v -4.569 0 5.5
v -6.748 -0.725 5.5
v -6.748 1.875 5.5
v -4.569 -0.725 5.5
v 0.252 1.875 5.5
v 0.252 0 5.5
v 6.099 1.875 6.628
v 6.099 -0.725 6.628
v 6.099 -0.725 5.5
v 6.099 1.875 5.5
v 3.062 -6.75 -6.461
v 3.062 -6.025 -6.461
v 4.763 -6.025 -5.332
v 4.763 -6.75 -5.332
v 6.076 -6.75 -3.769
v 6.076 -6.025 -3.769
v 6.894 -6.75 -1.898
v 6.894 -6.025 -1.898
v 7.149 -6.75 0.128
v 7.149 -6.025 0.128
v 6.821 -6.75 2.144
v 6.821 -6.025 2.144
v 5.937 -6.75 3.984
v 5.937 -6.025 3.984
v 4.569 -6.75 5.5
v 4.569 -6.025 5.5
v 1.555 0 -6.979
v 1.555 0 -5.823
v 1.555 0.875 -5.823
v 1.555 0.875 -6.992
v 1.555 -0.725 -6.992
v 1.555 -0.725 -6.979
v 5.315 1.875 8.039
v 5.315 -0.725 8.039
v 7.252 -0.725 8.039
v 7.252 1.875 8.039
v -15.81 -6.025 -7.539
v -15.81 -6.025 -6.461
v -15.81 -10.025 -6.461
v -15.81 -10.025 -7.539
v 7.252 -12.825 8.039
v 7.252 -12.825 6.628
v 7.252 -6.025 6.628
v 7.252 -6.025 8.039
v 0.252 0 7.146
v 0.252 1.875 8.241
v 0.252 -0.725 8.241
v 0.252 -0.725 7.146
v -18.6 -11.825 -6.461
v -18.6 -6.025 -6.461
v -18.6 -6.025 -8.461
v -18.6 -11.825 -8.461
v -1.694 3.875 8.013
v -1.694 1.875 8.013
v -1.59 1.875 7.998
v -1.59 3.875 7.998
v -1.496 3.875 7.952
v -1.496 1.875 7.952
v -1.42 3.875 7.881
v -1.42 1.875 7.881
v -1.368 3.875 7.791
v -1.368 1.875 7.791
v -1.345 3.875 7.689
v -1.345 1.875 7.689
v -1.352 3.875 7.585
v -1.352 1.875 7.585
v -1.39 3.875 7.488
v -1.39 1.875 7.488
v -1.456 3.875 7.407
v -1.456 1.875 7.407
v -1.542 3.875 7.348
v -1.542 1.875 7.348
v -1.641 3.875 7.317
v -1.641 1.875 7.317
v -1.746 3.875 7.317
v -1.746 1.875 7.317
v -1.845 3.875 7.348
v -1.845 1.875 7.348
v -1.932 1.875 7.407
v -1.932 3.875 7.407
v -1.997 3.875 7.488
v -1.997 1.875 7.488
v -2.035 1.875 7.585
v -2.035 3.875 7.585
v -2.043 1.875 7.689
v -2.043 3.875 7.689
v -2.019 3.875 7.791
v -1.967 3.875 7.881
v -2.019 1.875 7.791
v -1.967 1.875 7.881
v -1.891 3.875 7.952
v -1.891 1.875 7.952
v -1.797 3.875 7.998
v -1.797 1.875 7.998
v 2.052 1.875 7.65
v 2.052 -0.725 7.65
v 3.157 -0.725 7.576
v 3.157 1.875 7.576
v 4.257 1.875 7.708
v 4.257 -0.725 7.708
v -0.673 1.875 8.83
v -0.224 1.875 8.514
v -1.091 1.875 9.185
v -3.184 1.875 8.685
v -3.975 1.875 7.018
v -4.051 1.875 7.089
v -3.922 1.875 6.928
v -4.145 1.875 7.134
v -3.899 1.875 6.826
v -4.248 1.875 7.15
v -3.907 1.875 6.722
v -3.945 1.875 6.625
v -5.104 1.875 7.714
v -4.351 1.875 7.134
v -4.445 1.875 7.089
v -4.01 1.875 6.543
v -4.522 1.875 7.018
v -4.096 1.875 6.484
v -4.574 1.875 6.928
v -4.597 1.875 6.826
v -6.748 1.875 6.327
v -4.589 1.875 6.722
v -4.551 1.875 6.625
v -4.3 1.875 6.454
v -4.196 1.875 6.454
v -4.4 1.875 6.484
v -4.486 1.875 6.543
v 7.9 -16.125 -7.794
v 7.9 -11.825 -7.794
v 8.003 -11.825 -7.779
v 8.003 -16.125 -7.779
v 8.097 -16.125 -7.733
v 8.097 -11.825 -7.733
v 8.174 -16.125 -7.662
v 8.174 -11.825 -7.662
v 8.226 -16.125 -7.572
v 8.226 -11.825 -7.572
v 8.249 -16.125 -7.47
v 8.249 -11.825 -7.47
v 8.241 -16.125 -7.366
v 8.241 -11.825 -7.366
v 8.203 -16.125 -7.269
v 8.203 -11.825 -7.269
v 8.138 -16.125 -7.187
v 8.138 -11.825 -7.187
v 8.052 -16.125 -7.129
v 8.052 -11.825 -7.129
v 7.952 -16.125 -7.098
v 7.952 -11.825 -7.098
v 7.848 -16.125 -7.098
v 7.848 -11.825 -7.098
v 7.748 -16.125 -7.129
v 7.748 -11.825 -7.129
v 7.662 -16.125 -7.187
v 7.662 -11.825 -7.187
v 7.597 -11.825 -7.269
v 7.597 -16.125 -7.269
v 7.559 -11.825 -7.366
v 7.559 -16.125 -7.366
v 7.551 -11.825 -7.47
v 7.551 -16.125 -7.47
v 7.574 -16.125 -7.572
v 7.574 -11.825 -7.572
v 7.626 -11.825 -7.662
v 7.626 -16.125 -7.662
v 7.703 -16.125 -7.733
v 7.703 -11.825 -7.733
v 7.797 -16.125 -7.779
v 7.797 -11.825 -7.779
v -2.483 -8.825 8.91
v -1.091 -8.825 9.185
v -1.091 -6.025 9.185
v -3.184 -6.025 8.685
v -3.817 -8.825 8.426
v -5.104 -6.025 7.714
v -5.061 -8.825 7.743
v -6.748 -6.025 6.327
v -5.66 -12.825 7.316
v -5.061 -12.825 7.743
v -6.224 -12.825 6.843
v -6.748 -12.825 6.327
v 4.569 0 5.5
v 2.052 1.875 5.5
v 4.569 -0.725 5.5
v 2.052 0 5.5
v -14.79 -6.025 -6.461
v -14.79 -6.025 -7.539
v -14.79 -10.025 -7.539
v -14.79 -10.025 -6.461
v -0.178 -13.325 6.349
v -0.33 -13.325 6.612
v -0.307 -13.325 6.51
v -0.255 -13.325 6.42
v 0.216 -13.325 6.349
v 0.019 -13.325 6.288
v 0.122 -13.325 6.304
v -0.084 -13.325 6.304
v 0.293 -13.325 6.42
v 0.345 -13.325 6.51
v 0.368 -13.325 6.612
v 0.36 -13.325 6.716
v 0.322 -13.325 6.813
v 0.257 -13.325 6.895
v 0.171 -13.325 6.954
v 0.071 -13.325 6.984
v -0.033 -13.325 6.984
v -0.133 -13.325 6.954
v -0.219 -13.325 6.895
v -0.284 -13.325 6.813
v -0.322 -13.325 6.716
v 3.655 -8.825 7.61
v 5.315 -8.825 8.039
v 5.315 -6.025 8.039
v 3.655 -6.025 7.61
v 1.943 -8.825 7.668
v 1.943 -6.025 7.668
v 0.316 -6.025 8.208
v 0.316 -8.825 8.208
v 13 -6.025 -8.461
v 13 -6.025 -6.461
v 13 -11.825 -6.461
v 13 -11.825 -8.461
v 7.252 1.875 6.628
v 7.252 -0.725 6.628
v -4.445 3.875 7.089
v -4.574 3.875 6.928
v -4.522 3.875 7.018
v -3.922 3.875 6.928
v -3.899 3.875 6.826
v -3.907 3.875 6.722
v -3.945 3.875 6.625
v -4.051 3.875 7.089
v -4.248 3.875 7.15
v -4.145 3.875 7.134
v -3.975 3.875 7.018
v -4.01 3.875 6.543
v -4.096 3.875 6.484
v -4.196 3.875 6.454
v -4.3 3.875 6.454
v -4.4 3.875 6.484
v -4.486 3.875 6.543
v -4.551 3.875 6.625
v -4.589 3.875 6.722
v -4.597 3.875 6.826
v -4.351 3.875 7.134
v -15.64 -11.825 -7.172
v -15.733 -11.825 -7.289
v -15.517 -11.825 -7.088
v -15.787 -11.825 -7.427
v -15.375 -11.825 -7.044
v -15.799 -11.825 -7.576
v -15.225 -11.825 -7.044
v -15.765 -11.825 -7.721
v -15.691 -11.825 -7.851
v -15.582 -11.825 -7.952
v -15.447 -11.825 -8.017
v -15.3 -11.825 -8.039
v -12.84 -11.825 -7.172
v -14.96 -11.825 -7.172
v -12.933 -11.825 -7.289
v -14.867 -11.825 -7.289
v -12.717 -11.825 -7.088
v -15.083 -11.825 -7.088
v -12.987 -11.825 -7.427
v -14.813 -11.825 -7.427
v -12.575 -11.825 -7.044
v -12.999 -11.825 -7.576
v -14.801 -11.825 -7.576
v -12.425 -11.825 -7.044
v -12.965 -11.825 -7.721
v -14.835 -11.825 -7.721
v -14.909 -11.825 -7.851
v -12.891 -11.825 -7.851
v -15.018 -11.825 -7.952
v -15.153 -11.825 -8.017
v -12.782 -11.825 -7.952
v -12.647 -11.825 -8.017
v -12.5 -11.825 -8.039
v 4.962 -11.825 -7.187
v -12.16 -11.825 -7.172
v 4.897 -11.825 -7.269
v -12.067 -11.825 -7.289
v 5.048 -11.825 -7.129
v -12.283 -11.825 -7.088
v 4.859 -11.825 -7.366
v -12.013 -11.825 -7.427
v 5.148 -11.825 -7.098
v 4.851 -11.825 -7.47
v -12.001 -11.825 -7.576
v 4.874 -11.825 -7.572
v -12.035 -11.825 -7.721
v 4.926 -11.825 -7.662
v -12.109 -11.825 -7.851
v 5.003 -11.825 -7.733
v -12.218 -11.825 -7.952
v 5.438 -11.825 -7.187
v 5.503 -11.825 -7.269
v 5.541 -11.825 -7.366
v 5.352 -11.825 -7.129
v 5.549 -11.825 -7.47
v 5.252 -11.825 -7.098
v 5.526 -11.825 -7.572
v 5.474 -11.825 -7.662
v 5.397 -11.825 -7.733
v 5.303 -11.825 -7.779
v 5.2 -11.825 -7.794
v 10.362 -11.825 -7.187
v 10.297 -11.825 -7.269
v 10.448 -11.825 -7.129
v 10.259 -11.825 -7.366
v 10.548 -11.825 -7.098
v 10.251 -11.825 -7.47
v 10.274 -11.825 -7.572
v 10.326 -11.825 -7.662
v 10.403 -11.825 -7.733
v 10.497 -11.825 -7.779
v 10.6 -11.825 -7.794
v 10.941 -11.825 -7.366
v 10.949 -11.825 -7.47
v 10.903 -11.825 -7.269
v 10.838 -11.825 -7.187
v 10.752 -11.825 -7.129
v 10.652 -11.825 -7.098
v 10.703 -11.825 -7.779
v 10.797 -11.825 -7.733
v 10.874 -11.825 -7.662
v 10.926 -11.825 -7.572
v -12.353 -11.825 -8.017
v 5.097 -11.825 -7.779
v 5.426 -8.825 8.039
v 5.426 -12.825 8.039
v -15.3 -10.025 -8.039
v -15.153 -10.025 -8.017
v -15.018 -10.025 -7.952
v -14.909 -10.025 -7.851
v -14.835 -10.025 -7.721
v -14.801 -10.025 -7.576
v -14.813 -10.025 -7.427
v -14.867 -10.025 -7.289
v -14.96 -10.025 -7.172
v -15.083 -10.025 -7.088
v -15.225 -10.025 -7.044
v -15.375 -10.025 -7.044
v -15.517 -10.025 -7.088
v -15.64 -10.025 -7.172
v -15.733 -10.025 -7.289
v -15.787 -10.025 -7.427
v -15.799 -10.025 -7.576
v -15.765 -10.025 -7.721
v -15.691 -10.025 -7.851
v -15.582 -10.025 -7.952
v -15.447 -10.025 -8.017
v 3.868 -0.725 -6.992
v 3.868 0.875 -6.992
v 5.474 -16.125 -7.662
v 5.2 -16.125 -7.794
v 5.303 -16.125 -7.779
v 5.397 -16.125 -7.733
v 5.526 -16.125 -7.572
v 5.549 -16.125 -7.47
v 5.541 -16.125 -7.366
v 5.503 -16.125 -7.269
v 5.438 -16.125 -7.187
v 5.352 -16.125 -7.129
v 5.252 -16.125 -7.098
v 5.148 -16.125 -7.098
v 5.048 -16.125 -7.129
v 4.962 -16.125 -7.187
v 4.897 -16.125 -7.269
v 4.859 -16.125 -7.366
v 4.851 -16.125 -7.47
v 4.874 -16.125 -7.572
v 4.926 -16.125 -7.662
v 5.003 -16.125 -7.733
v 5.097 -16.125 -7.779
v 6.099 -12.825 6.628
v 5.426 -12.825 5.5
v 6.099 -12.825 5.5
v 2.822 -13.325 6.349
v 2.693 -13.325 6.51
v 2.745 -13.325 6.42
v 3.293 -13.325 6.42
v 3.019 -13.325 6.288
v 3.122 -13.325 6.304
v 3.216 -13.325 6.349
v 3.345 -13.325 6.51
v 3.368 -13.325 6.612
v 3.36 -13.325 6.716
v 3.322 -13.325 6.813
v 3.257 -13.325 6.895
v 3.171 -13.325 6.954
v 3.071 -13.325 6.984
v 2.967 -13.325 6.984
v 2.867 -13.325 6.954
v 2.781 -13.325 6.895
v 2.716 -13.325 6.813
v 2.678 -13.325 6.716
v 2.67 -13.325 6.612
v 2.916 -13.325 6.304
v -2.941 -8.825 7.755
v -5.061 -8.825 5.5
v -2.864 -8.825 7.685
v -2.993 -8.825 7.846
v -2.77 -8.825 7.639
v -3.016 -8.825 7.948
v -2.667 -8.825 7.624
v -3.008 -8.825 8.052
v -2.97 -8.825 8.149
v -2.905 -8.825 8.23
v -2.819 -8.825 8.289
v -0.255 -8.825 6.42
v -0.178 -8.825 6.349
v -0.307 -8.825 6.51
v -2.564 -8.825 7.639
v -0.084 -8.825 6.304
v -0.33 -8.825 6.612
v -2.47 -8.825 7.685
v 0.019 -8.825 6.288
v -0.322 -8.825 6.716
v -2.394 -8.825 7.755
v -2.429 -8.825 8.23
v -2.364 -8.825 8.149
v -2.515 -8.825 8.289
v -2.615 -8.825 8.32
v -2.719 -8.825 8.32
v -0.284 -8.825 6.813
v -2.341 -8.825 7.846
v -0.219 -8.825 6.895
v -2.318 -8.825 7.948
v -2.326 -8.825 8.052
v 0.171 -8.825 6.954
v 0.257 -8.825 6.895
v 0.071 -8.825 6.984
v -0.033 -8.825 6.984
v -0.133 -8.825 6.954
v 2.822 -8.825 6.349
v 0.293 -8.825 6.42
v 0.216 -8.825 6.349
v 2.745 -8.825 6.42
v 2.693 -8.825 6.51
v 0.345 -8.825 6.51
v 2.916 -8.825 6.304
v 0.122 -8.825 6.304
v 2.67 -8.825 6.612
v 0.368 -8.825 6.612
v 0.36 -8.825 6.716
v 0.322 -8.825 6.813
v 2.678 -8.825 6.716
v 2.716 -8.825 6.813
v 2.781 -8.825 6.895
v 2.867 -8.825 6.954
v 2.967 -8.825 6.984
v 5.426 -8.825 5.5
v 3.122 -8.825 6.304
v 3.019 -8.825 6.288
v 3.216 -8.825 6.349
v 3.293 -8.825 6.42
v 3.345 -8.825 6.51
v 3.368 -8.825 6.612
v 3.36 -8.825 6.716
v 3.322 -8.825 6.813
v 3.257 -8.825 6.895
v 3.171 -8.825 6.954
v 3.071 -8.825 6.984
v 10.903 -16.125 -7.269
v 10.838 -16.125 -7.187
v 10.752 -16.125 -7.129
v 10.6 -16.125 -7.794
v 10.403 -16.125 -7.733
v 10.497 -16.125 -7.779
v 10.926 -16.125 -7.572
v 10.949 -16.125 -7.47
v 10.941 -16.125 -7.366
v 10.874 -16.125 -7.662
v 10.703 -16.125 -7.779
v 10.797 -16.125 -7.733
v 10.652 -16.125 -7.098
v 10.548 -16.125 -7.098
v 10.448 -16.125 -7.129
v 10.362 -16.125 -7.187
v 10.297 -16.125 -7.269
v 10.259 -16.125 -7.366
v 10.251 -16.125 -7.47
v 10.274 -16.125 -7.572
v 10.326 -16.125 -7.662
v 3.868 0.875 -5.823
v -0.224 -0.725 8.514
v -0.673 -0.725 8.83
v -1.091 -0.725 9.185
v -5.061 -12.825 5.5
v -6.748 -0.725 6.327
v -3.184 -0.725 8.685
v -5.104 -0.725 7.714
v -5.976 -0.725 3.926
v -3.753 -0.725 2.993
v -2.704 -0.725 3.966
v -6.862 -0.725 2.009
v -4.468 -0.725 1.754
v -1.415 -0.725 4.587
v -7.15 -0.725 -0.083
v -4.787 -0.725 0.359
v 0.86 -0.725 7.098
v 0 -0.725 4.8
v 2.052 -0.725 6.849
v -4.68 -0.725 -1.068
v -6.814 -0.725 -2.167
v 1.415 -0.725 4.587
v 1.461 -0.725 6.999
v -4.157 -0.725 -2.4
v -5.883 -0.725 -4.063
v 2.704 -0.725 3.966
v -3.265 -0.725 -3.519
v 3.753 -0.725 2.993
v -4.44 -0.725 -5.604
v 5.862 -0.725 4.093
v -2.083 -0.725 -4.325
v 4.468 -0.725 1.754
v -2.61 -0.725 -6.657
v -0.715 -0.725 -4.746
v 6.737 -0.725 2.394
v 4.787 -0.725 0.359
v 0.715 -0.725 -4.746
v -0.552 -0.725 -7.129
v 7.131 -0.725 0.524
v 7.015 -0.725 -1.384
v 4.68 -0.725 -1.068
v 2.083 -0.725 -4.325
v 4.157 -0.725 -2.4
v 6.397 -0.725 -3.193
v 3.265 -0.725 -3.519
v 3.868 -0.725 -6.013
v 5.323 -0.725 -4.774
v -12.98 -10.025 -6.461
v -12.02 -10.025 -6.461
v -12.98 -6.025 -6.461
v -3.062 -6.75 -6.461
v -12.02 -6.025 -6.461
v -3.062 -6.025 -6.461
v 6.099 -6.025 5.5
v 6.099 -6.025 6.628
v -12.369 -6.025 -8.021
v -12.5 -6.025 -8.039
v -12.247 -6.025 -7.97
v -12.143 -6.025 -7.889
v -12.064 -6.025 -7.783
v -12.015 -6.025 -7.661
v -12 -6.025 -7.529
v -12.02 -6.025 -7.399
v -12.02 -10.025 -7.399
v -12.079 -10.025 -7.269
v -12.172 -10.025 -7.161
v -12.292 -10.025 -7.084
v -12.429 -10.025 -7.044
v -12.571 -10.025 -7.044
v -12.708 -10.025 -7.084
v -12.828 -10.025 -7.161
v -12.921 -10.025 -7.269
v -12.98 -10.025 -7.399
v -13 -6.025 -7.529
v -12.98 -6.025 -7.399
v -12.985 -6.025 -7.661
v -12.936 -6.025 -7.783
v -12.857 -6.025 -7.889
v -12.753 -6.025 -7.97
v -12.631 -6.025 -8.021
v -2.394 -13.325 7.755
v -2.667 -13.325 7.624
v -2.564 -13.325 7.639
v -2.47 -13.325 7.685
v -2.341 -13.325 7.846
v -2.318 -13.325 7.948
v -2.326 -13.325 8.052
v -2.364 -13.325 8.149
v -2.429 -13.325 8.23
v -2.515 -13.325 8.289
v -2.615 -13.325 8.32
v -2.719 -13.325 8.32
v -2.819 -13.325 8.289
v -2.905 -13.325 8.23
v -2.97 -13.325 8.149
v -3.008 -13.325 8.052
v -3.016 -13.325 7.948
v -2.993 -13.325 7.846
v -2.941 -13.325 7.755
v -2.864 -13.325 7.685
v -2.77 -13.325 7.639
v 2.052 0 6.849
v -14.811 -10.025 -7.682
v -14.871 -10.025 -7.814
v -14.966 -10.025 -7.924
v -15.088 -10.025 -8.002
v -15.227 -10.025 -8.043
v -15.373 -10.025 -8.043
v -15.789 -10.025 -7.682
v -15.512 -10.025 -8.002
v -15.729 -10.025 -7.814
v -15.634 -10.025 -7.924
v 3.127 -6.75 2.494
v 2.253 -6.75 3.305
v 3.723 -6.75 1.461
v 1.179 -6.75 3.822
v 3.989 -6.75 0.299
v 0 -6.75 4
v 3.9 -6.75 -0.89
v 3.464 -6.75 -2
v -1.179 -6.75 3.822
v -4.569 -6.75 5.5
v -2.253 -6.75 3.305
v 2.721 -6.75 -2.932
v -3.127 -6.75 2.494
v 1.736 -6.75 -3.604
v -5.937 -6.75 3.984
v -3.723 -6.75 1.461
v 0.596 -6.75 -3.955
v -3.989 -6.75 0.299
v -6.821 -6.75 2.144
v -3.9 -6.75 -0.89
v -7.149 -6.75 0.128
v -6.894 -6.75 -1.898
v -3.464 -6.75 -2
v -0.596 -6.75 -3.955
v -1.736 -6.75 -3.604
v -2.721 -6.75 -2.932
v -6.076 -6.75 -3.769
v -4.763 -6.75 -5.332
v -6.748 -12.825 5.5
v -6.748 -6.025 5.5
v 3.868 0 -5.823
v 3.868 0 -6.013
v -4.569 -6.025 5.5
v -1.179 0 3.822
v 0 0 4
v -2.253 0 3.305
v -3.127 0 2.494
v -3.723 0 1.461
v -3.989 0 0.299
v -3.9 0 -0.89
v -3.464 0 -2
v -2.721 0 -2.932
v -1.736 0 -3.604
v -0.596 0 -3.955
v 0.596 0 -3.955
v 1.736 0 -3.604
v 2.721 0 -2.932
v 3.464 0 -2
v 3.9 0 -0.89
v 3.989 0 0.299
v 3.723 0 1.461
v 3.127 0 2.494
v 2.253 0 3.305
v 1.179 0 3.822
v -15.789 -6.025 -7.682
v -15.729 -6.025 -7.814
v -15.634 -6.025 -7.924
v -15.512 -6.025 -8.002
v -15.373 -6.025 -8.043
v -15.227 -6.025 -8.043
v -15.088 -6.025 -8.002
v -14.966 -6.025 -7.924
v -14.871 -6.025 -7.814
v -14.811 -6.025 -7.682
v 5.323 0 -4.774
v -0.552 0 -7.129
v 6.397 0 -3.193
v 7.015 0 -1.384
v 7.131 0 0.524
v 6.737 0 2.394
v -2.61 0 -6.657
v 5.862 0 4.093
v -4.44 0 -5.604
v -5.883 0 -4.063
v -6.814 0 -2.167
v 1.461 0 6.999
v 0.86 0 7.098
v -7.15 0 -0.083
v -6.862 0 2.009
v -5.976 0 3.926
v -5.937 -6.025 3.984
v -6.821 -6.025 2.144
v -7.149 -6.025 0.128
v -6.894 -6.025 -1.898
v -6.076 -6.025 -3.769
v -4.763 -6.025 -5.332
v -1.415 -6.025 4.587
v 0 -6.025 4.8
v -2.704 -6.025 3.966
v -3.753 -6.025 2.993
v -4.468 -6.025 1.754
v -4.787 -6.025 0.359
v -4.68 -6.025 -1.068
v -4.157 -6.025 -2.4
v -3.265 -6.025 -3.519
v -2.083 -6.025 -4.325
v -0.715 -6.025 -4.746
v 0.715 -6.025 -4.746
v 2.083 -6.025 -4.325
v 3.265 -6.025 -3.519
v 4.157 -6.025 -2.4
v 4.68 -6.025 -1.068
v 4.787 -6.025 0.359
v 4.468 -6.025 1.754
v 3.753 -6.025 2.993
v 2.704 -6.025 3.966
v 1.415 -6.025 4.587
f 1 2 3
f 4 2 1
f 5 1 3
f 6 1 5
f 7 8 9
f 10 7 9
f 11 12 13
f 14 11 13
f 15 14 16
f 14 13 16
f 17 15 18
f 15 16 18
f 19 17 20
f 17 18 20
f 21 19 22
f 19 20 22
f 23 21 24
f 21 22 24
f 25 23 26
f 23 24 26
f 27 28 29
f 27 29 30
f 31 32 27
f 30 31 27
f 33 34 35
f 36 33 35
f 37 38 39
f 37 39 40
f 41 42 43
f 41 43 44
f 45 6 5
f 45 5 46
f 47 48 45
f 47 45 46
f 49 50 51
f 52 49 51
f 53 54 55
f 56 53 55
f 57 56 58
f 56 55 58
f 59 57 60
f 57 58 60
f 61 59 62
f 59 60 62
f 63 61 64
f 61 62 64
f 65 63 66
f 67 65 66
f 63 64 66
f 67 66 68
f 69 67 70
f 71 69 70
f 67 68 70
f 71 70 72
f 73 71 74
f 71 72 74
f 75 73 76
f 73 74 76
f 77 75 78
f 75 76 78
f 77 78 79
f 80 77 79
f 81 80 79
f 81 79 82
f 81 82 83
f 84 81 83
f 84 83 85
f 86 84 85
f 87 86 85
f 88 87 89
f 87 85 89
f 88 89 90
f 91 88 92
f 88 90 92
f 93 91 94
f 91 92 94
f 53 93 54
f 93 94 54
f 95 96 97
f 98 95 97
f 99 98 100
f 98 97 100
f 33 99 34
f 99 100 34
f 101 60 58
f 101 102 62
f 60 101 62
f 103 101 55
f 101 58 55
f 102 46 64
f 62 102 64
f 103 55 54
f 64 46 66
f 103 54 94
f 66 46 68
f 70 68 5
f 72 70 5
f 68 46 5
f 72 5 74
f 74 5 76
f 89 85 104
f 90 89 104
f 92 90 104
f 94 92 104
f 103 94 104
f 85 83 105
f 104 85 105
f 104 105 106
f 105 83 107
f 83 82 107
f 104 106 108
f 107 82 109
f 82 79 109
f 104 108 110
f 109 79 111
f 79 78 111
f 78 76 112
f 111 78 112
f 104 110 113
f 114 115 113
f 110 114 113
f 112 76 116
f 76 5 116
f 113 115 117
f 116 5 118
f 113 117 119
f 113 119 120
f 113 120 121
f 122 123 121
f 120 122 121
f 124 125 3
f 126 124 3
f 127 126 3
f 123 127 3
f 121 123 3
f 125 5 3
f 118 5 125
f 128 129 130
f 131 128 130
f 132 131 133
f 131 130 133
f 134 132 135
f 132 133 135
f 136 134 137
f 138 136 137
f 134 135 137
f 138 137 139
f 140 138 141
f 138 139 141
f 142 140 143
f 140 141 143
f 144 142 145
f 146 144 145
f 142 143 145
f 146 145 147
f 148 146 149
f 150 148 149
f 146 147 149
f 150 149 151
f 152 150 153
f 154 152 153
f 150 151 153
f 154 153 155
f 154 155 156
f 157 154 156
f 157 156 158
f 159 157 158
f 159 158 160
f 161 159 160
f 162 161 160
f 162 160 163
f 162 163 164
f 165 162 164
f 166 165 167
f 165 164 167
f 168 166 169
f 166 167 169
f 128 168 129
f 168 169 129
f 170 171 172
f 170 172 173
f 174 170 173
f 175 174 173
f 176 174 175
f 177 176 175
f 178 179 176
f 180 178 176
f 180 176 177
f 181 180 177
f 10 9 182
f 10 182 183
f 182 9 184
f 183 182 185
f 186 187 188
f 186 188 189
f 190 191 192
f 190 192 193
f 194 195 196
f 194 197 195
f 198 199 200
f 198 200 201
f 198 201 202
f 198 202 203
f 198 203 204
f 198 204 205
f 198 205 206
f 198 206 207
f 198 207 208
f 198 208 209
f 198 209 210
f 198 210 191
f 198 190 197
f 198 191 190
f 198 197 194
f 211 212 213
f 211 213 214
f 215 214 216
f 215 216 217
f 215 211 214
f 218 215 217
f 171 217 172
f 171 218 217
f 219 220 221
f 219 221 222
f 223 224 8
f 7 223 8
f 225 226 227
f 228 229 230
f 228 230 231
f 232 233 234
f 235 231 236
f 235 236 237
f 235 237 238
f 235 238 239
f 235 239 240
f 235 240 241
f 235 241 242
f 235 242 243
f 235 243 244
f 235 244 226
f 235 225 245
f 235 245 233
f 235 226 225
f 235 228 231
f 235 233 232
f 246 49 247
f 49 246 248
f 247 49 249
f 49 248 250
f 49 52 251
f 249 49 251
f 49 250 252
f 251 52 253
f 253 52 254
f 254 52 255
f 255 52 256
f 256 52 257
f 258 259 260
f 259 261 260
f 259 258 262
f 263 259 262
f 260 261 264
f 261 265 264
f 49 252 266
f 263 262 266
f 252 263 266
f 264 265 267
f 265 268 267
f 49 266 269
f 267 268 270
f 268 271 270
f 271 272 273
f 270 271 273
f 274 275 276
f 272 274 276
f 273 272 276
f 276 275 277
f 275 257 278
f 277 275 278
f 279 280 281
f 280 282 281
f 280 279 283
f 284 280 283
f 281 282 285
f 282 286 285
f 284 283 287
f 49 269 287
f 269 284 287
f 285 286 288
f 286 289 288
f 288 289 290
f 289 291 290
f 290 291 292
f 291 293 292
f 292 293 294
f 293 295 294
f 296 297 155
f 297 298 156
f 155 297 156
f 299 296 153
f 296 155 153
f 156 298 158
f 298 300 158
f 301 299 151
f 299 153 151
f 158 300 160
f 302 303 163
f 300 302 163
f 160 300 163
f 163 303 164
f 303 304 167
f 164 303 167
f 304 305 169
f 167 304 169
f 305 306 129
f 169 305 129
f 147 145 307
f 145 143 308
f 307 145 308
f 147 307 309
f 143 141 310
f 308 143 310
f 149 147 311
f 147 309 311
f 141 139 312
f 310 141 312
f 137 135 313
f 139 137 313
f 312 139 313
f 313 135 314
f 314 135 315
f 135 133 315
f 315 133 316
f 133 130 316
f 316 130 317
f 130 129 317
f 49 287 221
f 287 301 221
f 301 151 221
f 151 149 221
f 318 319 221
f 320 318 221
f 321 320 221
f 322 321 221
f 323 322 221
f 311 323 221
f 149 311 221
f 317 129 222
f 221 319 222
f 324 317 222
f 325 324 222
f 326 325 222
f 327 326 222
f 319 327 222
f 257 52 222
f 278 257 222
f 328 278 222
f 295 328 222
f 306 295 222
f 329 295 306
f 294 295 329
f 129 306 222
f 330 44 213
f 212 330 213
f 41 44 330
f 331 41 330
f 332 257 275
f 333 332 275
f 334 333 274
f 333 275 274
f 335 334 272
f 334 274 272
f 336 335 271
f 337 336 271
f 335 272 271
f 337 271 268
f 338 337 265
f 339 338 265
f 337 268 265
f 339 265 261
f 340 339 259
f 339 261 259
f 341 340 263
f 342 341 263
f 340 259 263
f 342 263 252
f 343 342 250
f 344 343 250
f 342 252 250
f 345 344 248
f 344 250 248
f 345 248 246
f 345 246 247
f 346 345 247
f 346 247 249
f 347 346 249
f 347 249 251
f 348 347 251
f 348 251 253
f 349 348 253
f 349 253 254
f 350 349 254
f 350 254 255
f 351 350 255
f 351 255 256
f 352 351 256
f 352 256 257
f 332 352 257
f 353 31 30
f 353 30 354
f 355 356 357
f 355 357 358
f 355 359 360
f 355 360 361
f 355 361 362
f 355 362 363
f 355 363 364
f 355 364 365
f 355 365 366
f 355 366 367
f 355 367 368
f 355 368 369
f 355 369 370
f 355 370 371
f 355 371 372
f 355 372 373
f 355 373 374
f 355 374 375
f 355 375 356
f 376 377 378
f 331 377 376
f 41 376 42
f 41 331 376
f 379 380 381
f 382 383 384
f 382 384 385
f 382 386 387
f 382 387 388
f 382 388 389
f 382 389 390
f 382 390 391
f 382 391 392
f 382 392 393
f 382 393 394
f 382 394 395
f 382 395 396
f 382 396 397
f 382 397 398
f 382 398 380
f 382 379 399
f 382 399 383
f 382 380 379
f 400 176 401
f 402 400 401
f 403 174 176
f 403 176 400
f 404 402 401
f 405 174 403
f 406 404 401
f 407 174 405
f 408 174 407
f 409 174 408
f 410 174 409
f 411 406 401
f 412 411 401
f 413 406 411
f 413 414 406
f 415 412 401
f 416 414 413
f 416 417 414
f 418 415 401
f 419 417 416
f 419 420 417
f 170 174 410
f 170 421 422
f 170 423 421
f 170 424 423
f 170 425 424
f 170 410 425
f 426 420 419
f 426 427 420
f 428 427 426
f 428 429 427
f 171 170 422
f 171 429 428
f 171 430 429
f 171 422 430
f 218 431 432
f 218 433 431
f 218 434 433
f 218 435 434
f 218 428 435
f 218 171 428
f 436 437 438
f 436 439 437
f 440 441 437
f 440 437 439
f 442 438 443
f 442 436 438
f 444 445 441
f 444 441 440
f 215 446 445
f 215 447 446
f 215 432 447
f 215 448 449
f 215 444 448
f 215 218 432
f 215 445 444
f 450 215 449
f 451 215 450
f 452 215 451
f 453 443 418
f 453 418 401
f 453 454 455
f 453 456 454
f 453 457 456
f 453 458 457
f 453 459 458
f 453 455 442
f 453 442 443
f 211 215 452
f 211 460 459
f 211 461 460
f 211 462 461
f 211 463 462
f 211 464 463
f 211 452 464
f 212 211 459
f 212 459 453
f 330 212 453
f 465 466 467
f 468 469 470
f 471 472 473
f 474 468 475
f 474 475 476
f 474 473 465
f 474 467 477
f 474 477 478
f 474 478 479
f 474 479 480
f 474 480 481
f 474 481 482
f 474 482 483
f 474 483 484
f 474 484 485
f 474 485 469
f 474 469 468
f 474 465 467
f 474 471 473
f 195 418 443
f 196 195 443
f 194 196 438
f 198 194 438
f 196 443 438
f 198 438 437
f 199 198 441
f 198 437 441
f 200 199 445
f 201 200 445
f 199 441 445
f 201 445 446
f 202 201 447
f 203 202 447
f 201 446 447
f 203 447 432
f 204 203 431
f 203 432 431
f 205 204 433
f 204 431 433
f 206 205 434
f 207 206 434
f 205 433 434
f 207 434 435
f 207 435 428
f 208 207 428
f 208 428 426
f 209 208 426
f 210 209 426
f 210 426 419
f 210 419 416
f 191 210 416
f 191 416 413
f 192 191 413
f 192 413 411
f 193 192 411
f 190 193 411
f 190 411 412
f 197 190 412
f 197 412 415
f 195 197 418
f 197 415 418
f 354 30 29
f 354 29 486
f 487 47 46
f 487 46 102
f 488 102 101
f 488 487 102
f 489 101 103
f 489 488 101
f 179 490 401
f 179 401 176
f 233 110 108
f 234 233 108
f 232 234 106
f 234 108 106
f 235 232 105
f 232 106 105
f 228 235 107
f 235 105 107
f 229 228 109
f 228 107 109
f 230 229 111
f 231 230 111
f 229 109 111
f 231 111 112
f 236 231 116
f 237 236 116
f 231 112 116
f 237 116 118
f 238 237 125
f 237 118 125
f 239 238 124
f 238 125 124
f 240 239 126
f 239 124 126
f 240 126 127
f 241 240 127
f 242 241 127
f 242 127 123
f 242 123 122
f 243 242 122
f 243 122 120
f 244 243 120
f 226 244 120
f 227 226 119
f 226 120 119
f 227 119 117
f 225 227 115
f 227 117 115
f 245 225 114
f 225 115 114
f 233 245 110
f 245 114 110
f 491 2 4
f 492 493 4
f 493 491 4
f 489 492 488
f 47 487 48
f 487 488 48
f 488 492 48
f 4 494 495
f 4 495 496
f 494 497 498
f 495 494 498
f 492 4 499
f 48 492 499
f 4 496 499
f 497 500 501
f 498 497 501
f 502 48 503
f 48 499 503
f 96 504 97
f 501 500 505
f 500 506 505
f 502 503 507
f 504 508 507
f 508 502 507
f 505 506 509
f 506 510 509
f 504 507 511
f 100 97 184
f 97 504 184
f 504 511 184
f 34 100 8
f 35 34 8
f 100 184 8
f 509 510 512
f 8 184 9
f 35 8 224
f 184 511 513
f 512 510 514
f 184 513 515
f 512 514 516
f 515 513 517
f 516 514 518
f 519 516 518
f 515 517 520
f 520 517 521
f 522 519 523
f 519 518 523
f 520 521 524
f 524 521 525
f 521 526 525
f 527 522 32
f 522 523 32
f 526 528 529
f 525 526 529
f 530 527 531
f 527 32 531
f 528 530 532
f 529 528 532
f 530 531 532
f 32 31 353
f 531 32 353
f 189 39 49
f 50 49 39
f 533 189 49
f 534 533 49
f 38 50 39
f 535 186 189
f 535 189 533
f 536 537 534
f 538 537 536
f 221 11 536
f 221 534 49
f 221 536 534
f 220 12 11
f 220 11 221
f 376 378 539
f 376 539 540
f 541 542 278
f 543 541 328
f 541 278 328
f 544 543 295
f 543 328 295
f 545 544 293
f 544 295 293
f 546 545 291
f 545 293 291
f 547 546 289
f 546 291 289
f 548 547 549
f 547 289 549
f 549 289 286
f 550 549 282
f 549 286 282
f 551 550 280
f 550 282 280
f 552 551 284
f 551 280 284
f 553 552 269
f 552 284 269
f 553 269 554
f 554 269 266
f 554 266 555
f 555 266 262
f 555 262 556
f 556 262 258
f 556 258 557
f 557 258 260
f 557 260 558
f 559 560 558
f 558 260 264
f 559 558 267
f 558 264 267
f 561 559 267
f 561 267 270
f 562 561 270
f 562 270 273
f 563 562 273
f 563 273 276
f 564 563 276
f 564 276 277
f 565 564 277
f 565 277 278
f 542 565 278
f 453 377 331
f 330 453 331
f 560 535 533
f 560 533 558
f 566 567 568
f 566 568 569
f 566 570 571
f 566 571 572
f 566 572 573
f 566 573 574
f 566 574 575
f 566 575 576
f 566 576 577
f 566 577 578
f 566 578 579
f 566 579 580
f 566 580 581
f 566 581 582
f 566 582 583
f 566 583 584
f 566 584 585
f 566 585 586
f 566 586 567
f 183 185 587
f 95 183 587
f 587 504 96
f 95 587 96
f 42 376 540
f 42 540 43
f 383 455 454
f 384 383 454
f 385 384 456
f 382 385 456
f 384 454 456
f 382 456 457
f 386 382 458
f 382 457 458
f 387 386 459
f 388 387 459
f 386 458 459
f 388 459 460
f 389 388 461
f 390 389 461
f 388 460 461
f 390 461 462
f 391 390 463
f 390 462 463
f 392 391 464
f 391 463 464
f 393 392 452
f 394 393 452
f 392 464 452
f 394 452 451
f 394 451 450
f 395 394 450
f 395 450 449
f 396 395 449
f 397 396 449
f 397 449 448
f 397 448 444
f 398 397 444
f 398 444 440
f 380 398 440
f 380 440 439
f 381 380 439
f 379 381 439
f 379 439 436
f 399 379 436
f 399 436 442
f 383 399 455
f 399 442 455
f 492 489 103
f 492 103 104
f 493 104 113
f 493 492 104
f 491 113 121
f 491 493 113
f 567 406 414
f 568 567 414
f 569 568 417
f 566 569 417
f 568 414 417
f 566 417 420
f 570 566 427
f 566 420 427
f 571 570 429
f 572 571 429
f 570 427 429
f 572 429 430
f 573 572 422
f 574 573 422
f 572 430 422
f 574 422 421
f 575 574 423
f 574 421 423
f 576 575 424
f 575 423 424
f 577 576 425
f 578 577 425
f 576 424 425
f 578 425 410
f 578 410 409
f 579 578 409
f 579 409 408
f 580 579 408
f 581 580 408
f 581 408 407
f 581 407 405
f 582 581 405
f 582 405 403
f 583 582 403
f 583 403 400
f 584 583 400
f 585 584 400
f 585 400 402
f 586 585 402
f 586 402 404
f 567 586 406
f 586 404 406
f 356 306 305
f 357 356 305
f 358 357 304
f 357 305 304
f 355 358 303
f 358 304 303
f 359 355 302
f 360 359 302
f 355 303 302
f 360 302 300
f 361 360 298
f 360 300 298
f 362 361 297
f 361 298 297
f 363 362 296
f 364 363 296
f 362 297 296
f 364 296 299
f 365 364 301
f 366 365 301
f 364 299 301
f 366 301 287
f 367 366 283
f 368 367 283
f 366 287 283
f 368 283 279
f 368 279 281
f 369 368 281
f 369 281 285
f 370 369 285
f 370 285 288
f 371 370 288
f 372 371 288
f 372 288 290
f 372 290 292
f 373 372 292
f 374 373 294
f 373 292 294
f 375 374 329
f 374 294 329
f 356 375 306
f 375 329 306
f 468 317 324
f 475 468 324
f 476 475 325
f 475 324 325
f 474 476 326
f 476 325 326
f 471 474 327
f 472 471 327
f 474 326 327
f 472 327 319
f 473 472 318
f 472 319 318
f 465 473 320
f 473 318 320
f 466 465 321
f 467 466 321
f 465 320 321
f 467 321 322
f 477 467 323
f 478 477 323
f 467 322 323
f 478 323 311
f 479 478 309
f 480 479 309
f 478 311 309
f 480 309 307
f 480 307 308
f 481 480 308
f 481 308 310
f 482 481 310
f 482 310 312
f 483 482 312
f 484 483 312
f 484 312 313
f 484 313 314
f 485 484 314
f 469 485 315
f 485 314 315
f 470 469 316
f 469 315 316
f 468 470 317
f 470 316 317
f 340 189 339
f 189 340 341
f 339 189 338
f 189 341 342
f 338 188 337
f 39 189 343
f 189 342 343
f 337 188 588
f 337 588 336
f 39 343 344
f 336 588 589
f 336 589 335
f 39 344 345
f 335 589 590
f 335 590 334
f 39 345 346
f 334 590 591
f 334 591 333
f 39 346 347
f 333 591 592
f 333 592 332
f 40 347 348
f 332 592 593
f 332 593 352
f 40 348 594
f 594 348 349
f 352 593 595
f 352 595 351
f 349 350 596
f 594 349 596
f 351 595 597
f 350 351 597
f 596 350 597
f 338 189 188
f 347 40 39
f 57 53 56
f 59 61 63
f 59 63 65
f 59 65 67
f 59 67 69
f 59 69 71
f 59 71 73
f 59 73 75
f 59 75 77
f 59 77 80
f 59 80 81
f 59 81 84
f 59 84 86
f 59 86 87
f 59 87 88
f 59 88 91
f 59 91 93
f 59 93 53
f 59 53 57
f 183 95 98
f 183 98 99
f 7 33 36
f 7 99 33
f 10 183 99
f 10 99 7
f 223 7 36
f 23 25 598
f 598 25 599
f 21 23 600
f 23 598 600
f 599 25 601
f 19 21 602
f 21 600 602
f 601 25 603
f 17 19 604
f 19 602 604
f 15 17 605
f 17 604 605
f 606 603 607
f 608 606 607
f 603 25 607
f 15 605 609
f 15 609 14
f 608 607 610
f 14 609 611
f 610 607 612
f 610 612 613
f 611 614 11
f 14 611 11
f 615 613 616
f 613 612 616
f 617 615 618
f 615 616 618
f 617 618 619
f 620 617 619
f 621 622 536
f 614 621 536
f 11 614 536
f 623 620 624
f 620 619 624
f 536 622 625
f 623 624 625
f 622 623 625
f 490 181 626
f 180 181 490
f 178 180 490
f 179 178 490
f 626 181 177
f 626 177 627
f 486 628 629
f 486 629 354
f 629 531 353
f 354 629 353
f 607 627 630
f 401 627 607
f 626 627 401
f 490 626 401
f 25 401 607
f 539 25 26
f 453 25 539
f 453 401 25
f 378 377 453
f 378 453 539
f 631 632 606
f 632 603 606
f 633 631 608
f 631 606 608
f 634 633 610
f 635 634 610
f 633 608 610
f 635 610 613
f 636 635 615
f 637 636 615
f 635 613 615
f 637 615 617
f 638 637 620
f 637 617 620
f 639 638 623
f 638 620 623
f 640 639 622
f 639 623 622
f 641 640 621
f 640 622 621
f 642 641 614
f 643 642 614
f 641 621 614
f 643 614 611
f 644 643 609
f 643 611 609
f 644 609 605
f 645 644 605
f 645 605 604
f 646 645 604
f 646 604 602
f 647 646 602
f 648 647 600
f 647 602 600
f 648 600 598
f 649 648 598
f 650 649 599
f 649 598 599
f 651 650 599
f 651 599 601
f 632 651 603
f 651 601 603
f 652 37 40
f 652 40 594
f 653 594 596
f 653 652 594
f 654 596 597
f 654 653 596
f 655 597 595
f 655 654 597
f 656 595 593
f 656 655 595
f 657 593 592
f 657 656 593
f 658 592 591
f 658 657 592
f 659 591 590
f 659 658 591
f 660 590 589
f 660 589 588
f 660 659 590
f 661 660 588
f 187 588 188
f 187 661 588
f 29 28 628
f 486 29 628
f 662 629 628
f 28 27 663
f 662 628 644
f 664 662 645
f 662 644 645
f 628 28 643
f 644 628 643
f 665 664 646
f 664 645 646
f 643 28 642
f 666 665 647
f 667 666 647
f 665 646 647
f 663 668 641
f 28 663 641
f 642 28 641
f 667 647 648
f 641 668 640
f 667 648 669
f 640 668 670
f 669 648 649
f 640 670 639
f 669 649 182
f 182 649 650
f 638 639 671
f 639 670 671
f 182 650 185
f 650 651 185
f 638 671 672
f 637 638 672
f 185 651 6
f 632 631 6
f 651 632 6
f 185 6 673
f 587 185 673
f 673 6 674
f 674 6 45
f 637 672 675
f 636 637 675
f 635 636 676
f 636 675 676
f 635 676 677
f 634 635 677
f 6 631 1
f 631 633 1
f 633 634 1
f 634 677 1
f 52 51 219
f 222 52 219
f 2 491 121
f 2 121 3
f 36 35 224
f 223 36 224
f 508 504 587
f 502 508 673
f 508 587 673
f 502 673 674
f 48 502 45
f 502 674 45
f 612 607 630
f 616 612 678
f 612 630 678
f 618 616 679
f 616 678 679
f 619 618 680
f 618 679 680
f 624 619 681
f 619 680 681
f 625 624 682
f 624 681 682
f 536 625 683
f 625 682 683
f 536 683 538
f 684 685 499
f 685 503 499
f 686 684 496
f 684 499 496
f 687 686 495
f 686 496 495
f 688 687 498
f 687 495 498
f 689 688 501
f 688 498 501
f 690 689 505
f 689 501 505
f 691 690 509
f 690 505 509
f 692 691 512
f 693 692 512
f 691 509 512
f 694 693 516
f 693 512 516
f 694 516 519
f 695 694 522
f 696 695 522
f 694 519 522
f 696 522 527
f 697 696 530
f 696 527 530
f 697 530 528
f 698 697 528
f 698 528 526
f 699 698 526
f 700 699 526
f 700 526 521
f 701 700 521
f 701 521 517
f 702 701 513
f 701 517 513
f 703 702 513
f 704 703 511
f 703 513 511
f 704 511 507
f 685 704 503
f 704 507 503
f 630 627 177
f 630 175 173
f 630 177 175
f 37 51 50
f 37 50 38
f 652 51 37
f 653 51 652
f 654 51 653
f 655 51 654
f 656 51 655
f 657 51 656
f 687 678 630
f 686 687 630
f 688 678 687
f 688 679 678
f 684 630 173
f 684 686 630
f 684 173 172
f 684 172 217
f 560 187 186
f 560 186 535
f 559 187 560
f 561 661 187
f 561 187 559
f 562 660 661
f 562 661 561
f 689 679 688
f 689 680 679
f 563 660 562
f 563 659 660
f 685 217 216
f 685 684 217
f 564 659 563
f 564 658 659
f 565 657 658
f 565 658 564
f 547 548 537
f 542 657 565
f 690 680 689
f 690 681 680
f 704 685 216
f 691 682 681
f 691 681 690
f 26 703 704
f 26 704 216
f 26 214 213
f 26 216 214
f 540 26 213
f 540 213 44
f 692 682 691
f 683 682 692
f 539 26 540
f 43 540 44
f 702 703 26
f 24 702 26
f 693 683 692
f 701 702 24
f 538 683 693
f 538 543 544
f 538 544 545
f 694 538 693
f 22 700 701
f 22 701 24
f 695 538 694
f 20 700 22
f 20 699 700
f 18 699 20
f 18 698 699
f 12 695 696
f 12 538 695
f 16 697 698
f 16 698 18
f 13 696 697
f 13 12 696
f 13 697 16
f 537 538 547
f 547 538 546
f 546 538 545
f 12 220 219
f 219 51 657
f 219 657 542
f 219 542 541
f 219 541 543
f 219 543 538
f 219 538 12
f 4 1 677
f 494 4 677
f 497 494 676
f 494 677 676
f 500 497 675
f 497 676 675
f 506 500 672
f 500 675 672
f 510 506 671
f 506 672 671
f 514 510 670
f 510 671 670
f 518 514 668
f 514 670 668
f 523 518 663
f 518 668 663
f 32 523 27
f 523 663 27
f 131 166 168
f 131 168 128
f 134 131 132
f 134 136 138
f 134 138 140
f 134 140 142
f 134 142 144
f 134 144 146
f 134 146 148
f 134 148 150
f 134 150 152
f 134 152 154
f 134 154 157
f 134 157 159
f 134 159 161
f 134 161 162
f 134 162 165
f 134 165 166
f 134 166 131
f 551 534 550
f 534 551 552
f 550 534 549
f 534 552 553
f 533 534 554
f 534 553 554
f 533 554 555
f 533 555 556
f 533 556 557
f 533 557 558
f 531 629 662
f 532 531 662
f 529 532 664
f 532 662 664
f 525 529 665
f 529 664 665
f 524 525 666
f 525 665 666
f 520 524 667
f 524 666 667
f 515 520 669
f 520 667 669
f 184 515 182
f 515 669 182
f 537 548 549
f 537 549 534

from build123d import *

# Parameters (mm, degrees)
EXTRUDE_1_DEPTH     = 2.6
SKETCH_3_W          = 2.3134287
SKETCH_3_H          = 1.168890291
EXTRUDE_2_DEPTH     = 1.6
EXTRUDE_START       = 6.8
EXTRUDE_3_DEPTH     = 6.8
SKETCH_5_W          = 10.486803681
SKETCH_5_H          = 4.741640899
CUT_EXTRUDE_1_DEPTH = 4
SKETCH_6_R          = 0.35
EXTRUDE_4_DEPTH     = 4.5
SKETCH_7_W          = 31.6
SKETCH_7_H          = 2
EXTRUDE_5_DEPTH     = 5.8
SKETCH_8_R          = 0.35
EXTRUDE_6_DEPTH     = 4.3
SKETCH_9_R          = 0.5
CUT_EXTRUDE_2_DEPTH = 14.3
SKETCH_10_R         = 0.35
EXTRUDE_7_DEPTH     = 2
CUT_EXTRUDE_3_DEPTH = 4


with BuildPart() as part:
    # 草图1 → 旋转1 (revolve)
    with BuildSketch(Plane.XY, mode=Mode.PRIVATE) as revolve_1_sk:
        Polygon((4, 0), (4, -6.75), (7.15, -6.75), (7.15, -6.025), (4.8, -6.025), (4.8, -0.725), (7.15, -0.725), (7.15, 0), align=None)
    revolve(revolve_1_sk.sketch.rotate(Axis((0, 5.836385512, 0), (0, -1, 0)), 90), axis=Axis((0, 5.836385512, 0), (0, -1, 0)))

    # 草图2 → 凸台-拉伸1 (add)
    with BuildSketch(Plane(origin=(0, -0.725, 0), x_dir=(1, 0, 0), z_dir=(0, 1, 0))):
        with BuildLine():
            Line((5.314505692, -8.038664756), (7.251946558, -8.038664756))
            Line((7.251946558, -8.038664756), (7.251946558, -6.627550318))
            Line((7.251946558, -6.627550318), (6.099354415, -6.627550318))
            Line((6.099354415, -6.627550318), (6.099354415, -5.5))
            Line((6.099354415, -5.5), (2.051946558, -5.5))
            Line((2.051946558, -5.5), (2.051946558, -7.649656343))
            ThreePointArc((2.051946558, -7.649656343), (3.710373018, -7.616483358), (5.314505692, -8.038664756))
        make_face()
        with BuildLine():
            Line((-6.748053442, -5.5), (0.251946558, -5.5))
            Line((0.251946558, -5.5), (0.251946558, -8.240596845))
            ThreePointArc((0.251946558, -8.240596845), (-0.452097429, -8.666836759), (-1.091188438, -9.185412772))
            ThreePointArc((-1.091188438, -9.185412772), (-4.172119956, -8.255659578), (-6.748053442, -6.32663218))
            Line((-6.748053442, -6.32663218), (-6.748053442, -5.5))
        make_face()
    extrude(amount=EXTRUDE_1_DEPTH)

    # 草图3 → 凸台-拉伸2 (add)
    with BuildSketch(Plane(origin=(0, -0.725, 0), x_dir=(1, 0, 0), z_dir=(0, 1, 0))):
        with Locations((2.711416285, 6.407720863)):
            Rectangle(SKETCH_3_W, SKETCH_3_H)
    extrude(amount=EXTRUDE_2_DEPTH)

    # 草图4 → 凸台-拉伸3 (add)
    with BuildSketch(Plane.XZ.offset(6.025).offset(EXTRUDE_START)):
        with BuildLine():
            Line((-6.748053442, 6.32663218), (-6.748053442, 5.5))
            Line((-6.748053442, 5.5), (6.099354415, 5.5))
            Line((6.099354415, 5.5), (6.099354415, 6.627550318))
            Line((6.099354415, 6.627550318), (7.251946558, 6.627550318))
            Line((7.251946558, 6.627550318), (7.251946558, 8.038664756))
            Line((7.251946558, 8.038664756), (5.314505692, 8.038664756))
            ThreePointArc((5.314505692, 8.038664756), (1.942688245, 7.668176144), (-1.091188438, 9.185412772))
            ThreePointArc((-1.091188438, 9.185412772), (-4.172119956, 8.255659578), (-6.748053442, 6.32663218))
        make_face()
    extrude(amount=-EXTRUDE_3_DEPTH)

    # 草图5 → 切除-拉伸1 (cut)
    with BuildSketch(Plane.XZ.offset(12.825)):
        with Locations((0.182685526, 7.497044948)):
            Rectangle(SKETCH_5_W, SKETCH_5_H)
    extrude(amount=-CUT_EXTRUDE_1_DEPTH, mode=Mode.SUBTRACT)

    # 草图6 → 凸台-拉伸4 (add)
    with BuildSketch(Plane.XZ.offset(8.825)):
        with Locations(Location((3.019135042, 6.638228249, 0), (0, 0, 270))):
            Circle(SKETCH_6_R)
        with Locations(Location((0.019135042, 6.638228249, 0), (0, 0, 270))):
            Circle(SKETCH_6_R)
        with Locations(Location((-2.66722627, 7.973691801, 0), (0, 0, 270))):
            Circle(SKETCH_6_R)
    extrude(amount=EXTRUDE_4_DEPTH)

    # 草图7 → 凸台-拉伸5 (add)
    with BuildSketch(Plane(origin=(0, -6.025, 0), x_dir=(1, 0, 0), z_dir=(0, 1, 0))):
        with Locations((-2.8, 7.461335244)):
            Rectangle(SKETCH_7_W, SKETCH_7_H)
    extrude(amount=-EXTRUDE_5_DEPTH)

    # 草图8 → 凸台-拉伸6 (add)
    with BuildSketch(Plane.XZ.offset(11.825)):
        with Locations(Location((10.6, -7.444051339, 0), (0, 0, 270))):
            Circle(SKETCH_8_R)
        with Locations(Location((7.9, -7.444051339, 0), (0, 0, 270))):
            Circle(SKETCH_8_R)
        with Locations(Location((5.2, -7.444051339, 0), (0, 0, 270))):
            Circle(SKETCH_8_R)
    extrude(amount=EXTRUDE_6_DEPTH)

    # 草图9 → 切除-拉伸2 (cut)
    with BuildSketch(Plane.XZ.offset(11.825)):
        with Locations(Location((-15.3, -7.538758776, 0), (0, 0, 270))):
            Circle(SKETCH_9_R)
        with Locations(Location((-12.5, -7.538758776, 0), (0, 0, 270))):
            Circle(SKETCH_9_R)
    extrude(amount=-CUT_EXTRUDE_2_DEPTH, mode=Mode.SUBTRACT)

    # 草图10 → 凸台-拉伸7 (add)
    with BuildSketch(Plane(origin=(0, 1.875, 0), x_dir=(1, 0, 0), z_dir=(0, 1, 0))):
        with Locations(Location((-4.248213346, -6.799713472, 0), (0, 0, 270))):
            Circle(SKETCH_10_R)
        with Locations(Location((-1.693600984, -7.663244411, 0), (0, 0, 270))):
            Circle(SKETCH_10_R)
    extrude(amount=EXTRUDE_7_DEPTH)

    # 草图11 → 切除-拉伸3 (cut)
    with BuildSketch(Plane(origin=(0, -6.025, 0), x_dir=(1, 0, 0), z_dir=(0, 1, 0))):
        with BuildLine():
            Line((-14.790486895, 7.538758776), (-14.790486895, 5.844589861))
            ThreePointArc((-14.790486895, 5.844589861), (-15.3, 5.335076756), (-15.809513105, 5.844589861))
            Line((-15.809513105, 5.844589861), (-15.809513105, 7.538758776))
            ThreePointArc((-15.809513105, 7.538758776), (-15.3, 8.048271881), (-14.790486895, 7.538758776))
        make_face()
        with BuildLine():
            Line((-12.019991798, 7.538758776), (-12.019991798, 5.628707126))
            ThreePointArc((-12.019991798, 5.628707126), (-12.5, 5.148698925), (-12.980008202, 5.628707126))
            Line((-12.980008202, 5.628707126), (-12.980008202, 7.538758776))
            ThreePointArc((-12.980008202, 7.538758776), (-12.5, 8.018766978), (-12.019991798, 7.538758776))
        make_face()
    extrude(amount=-CUT_EXTRUDE_3_DEPTH, mode=Mode.SUBTRACT)


solid = part.part
